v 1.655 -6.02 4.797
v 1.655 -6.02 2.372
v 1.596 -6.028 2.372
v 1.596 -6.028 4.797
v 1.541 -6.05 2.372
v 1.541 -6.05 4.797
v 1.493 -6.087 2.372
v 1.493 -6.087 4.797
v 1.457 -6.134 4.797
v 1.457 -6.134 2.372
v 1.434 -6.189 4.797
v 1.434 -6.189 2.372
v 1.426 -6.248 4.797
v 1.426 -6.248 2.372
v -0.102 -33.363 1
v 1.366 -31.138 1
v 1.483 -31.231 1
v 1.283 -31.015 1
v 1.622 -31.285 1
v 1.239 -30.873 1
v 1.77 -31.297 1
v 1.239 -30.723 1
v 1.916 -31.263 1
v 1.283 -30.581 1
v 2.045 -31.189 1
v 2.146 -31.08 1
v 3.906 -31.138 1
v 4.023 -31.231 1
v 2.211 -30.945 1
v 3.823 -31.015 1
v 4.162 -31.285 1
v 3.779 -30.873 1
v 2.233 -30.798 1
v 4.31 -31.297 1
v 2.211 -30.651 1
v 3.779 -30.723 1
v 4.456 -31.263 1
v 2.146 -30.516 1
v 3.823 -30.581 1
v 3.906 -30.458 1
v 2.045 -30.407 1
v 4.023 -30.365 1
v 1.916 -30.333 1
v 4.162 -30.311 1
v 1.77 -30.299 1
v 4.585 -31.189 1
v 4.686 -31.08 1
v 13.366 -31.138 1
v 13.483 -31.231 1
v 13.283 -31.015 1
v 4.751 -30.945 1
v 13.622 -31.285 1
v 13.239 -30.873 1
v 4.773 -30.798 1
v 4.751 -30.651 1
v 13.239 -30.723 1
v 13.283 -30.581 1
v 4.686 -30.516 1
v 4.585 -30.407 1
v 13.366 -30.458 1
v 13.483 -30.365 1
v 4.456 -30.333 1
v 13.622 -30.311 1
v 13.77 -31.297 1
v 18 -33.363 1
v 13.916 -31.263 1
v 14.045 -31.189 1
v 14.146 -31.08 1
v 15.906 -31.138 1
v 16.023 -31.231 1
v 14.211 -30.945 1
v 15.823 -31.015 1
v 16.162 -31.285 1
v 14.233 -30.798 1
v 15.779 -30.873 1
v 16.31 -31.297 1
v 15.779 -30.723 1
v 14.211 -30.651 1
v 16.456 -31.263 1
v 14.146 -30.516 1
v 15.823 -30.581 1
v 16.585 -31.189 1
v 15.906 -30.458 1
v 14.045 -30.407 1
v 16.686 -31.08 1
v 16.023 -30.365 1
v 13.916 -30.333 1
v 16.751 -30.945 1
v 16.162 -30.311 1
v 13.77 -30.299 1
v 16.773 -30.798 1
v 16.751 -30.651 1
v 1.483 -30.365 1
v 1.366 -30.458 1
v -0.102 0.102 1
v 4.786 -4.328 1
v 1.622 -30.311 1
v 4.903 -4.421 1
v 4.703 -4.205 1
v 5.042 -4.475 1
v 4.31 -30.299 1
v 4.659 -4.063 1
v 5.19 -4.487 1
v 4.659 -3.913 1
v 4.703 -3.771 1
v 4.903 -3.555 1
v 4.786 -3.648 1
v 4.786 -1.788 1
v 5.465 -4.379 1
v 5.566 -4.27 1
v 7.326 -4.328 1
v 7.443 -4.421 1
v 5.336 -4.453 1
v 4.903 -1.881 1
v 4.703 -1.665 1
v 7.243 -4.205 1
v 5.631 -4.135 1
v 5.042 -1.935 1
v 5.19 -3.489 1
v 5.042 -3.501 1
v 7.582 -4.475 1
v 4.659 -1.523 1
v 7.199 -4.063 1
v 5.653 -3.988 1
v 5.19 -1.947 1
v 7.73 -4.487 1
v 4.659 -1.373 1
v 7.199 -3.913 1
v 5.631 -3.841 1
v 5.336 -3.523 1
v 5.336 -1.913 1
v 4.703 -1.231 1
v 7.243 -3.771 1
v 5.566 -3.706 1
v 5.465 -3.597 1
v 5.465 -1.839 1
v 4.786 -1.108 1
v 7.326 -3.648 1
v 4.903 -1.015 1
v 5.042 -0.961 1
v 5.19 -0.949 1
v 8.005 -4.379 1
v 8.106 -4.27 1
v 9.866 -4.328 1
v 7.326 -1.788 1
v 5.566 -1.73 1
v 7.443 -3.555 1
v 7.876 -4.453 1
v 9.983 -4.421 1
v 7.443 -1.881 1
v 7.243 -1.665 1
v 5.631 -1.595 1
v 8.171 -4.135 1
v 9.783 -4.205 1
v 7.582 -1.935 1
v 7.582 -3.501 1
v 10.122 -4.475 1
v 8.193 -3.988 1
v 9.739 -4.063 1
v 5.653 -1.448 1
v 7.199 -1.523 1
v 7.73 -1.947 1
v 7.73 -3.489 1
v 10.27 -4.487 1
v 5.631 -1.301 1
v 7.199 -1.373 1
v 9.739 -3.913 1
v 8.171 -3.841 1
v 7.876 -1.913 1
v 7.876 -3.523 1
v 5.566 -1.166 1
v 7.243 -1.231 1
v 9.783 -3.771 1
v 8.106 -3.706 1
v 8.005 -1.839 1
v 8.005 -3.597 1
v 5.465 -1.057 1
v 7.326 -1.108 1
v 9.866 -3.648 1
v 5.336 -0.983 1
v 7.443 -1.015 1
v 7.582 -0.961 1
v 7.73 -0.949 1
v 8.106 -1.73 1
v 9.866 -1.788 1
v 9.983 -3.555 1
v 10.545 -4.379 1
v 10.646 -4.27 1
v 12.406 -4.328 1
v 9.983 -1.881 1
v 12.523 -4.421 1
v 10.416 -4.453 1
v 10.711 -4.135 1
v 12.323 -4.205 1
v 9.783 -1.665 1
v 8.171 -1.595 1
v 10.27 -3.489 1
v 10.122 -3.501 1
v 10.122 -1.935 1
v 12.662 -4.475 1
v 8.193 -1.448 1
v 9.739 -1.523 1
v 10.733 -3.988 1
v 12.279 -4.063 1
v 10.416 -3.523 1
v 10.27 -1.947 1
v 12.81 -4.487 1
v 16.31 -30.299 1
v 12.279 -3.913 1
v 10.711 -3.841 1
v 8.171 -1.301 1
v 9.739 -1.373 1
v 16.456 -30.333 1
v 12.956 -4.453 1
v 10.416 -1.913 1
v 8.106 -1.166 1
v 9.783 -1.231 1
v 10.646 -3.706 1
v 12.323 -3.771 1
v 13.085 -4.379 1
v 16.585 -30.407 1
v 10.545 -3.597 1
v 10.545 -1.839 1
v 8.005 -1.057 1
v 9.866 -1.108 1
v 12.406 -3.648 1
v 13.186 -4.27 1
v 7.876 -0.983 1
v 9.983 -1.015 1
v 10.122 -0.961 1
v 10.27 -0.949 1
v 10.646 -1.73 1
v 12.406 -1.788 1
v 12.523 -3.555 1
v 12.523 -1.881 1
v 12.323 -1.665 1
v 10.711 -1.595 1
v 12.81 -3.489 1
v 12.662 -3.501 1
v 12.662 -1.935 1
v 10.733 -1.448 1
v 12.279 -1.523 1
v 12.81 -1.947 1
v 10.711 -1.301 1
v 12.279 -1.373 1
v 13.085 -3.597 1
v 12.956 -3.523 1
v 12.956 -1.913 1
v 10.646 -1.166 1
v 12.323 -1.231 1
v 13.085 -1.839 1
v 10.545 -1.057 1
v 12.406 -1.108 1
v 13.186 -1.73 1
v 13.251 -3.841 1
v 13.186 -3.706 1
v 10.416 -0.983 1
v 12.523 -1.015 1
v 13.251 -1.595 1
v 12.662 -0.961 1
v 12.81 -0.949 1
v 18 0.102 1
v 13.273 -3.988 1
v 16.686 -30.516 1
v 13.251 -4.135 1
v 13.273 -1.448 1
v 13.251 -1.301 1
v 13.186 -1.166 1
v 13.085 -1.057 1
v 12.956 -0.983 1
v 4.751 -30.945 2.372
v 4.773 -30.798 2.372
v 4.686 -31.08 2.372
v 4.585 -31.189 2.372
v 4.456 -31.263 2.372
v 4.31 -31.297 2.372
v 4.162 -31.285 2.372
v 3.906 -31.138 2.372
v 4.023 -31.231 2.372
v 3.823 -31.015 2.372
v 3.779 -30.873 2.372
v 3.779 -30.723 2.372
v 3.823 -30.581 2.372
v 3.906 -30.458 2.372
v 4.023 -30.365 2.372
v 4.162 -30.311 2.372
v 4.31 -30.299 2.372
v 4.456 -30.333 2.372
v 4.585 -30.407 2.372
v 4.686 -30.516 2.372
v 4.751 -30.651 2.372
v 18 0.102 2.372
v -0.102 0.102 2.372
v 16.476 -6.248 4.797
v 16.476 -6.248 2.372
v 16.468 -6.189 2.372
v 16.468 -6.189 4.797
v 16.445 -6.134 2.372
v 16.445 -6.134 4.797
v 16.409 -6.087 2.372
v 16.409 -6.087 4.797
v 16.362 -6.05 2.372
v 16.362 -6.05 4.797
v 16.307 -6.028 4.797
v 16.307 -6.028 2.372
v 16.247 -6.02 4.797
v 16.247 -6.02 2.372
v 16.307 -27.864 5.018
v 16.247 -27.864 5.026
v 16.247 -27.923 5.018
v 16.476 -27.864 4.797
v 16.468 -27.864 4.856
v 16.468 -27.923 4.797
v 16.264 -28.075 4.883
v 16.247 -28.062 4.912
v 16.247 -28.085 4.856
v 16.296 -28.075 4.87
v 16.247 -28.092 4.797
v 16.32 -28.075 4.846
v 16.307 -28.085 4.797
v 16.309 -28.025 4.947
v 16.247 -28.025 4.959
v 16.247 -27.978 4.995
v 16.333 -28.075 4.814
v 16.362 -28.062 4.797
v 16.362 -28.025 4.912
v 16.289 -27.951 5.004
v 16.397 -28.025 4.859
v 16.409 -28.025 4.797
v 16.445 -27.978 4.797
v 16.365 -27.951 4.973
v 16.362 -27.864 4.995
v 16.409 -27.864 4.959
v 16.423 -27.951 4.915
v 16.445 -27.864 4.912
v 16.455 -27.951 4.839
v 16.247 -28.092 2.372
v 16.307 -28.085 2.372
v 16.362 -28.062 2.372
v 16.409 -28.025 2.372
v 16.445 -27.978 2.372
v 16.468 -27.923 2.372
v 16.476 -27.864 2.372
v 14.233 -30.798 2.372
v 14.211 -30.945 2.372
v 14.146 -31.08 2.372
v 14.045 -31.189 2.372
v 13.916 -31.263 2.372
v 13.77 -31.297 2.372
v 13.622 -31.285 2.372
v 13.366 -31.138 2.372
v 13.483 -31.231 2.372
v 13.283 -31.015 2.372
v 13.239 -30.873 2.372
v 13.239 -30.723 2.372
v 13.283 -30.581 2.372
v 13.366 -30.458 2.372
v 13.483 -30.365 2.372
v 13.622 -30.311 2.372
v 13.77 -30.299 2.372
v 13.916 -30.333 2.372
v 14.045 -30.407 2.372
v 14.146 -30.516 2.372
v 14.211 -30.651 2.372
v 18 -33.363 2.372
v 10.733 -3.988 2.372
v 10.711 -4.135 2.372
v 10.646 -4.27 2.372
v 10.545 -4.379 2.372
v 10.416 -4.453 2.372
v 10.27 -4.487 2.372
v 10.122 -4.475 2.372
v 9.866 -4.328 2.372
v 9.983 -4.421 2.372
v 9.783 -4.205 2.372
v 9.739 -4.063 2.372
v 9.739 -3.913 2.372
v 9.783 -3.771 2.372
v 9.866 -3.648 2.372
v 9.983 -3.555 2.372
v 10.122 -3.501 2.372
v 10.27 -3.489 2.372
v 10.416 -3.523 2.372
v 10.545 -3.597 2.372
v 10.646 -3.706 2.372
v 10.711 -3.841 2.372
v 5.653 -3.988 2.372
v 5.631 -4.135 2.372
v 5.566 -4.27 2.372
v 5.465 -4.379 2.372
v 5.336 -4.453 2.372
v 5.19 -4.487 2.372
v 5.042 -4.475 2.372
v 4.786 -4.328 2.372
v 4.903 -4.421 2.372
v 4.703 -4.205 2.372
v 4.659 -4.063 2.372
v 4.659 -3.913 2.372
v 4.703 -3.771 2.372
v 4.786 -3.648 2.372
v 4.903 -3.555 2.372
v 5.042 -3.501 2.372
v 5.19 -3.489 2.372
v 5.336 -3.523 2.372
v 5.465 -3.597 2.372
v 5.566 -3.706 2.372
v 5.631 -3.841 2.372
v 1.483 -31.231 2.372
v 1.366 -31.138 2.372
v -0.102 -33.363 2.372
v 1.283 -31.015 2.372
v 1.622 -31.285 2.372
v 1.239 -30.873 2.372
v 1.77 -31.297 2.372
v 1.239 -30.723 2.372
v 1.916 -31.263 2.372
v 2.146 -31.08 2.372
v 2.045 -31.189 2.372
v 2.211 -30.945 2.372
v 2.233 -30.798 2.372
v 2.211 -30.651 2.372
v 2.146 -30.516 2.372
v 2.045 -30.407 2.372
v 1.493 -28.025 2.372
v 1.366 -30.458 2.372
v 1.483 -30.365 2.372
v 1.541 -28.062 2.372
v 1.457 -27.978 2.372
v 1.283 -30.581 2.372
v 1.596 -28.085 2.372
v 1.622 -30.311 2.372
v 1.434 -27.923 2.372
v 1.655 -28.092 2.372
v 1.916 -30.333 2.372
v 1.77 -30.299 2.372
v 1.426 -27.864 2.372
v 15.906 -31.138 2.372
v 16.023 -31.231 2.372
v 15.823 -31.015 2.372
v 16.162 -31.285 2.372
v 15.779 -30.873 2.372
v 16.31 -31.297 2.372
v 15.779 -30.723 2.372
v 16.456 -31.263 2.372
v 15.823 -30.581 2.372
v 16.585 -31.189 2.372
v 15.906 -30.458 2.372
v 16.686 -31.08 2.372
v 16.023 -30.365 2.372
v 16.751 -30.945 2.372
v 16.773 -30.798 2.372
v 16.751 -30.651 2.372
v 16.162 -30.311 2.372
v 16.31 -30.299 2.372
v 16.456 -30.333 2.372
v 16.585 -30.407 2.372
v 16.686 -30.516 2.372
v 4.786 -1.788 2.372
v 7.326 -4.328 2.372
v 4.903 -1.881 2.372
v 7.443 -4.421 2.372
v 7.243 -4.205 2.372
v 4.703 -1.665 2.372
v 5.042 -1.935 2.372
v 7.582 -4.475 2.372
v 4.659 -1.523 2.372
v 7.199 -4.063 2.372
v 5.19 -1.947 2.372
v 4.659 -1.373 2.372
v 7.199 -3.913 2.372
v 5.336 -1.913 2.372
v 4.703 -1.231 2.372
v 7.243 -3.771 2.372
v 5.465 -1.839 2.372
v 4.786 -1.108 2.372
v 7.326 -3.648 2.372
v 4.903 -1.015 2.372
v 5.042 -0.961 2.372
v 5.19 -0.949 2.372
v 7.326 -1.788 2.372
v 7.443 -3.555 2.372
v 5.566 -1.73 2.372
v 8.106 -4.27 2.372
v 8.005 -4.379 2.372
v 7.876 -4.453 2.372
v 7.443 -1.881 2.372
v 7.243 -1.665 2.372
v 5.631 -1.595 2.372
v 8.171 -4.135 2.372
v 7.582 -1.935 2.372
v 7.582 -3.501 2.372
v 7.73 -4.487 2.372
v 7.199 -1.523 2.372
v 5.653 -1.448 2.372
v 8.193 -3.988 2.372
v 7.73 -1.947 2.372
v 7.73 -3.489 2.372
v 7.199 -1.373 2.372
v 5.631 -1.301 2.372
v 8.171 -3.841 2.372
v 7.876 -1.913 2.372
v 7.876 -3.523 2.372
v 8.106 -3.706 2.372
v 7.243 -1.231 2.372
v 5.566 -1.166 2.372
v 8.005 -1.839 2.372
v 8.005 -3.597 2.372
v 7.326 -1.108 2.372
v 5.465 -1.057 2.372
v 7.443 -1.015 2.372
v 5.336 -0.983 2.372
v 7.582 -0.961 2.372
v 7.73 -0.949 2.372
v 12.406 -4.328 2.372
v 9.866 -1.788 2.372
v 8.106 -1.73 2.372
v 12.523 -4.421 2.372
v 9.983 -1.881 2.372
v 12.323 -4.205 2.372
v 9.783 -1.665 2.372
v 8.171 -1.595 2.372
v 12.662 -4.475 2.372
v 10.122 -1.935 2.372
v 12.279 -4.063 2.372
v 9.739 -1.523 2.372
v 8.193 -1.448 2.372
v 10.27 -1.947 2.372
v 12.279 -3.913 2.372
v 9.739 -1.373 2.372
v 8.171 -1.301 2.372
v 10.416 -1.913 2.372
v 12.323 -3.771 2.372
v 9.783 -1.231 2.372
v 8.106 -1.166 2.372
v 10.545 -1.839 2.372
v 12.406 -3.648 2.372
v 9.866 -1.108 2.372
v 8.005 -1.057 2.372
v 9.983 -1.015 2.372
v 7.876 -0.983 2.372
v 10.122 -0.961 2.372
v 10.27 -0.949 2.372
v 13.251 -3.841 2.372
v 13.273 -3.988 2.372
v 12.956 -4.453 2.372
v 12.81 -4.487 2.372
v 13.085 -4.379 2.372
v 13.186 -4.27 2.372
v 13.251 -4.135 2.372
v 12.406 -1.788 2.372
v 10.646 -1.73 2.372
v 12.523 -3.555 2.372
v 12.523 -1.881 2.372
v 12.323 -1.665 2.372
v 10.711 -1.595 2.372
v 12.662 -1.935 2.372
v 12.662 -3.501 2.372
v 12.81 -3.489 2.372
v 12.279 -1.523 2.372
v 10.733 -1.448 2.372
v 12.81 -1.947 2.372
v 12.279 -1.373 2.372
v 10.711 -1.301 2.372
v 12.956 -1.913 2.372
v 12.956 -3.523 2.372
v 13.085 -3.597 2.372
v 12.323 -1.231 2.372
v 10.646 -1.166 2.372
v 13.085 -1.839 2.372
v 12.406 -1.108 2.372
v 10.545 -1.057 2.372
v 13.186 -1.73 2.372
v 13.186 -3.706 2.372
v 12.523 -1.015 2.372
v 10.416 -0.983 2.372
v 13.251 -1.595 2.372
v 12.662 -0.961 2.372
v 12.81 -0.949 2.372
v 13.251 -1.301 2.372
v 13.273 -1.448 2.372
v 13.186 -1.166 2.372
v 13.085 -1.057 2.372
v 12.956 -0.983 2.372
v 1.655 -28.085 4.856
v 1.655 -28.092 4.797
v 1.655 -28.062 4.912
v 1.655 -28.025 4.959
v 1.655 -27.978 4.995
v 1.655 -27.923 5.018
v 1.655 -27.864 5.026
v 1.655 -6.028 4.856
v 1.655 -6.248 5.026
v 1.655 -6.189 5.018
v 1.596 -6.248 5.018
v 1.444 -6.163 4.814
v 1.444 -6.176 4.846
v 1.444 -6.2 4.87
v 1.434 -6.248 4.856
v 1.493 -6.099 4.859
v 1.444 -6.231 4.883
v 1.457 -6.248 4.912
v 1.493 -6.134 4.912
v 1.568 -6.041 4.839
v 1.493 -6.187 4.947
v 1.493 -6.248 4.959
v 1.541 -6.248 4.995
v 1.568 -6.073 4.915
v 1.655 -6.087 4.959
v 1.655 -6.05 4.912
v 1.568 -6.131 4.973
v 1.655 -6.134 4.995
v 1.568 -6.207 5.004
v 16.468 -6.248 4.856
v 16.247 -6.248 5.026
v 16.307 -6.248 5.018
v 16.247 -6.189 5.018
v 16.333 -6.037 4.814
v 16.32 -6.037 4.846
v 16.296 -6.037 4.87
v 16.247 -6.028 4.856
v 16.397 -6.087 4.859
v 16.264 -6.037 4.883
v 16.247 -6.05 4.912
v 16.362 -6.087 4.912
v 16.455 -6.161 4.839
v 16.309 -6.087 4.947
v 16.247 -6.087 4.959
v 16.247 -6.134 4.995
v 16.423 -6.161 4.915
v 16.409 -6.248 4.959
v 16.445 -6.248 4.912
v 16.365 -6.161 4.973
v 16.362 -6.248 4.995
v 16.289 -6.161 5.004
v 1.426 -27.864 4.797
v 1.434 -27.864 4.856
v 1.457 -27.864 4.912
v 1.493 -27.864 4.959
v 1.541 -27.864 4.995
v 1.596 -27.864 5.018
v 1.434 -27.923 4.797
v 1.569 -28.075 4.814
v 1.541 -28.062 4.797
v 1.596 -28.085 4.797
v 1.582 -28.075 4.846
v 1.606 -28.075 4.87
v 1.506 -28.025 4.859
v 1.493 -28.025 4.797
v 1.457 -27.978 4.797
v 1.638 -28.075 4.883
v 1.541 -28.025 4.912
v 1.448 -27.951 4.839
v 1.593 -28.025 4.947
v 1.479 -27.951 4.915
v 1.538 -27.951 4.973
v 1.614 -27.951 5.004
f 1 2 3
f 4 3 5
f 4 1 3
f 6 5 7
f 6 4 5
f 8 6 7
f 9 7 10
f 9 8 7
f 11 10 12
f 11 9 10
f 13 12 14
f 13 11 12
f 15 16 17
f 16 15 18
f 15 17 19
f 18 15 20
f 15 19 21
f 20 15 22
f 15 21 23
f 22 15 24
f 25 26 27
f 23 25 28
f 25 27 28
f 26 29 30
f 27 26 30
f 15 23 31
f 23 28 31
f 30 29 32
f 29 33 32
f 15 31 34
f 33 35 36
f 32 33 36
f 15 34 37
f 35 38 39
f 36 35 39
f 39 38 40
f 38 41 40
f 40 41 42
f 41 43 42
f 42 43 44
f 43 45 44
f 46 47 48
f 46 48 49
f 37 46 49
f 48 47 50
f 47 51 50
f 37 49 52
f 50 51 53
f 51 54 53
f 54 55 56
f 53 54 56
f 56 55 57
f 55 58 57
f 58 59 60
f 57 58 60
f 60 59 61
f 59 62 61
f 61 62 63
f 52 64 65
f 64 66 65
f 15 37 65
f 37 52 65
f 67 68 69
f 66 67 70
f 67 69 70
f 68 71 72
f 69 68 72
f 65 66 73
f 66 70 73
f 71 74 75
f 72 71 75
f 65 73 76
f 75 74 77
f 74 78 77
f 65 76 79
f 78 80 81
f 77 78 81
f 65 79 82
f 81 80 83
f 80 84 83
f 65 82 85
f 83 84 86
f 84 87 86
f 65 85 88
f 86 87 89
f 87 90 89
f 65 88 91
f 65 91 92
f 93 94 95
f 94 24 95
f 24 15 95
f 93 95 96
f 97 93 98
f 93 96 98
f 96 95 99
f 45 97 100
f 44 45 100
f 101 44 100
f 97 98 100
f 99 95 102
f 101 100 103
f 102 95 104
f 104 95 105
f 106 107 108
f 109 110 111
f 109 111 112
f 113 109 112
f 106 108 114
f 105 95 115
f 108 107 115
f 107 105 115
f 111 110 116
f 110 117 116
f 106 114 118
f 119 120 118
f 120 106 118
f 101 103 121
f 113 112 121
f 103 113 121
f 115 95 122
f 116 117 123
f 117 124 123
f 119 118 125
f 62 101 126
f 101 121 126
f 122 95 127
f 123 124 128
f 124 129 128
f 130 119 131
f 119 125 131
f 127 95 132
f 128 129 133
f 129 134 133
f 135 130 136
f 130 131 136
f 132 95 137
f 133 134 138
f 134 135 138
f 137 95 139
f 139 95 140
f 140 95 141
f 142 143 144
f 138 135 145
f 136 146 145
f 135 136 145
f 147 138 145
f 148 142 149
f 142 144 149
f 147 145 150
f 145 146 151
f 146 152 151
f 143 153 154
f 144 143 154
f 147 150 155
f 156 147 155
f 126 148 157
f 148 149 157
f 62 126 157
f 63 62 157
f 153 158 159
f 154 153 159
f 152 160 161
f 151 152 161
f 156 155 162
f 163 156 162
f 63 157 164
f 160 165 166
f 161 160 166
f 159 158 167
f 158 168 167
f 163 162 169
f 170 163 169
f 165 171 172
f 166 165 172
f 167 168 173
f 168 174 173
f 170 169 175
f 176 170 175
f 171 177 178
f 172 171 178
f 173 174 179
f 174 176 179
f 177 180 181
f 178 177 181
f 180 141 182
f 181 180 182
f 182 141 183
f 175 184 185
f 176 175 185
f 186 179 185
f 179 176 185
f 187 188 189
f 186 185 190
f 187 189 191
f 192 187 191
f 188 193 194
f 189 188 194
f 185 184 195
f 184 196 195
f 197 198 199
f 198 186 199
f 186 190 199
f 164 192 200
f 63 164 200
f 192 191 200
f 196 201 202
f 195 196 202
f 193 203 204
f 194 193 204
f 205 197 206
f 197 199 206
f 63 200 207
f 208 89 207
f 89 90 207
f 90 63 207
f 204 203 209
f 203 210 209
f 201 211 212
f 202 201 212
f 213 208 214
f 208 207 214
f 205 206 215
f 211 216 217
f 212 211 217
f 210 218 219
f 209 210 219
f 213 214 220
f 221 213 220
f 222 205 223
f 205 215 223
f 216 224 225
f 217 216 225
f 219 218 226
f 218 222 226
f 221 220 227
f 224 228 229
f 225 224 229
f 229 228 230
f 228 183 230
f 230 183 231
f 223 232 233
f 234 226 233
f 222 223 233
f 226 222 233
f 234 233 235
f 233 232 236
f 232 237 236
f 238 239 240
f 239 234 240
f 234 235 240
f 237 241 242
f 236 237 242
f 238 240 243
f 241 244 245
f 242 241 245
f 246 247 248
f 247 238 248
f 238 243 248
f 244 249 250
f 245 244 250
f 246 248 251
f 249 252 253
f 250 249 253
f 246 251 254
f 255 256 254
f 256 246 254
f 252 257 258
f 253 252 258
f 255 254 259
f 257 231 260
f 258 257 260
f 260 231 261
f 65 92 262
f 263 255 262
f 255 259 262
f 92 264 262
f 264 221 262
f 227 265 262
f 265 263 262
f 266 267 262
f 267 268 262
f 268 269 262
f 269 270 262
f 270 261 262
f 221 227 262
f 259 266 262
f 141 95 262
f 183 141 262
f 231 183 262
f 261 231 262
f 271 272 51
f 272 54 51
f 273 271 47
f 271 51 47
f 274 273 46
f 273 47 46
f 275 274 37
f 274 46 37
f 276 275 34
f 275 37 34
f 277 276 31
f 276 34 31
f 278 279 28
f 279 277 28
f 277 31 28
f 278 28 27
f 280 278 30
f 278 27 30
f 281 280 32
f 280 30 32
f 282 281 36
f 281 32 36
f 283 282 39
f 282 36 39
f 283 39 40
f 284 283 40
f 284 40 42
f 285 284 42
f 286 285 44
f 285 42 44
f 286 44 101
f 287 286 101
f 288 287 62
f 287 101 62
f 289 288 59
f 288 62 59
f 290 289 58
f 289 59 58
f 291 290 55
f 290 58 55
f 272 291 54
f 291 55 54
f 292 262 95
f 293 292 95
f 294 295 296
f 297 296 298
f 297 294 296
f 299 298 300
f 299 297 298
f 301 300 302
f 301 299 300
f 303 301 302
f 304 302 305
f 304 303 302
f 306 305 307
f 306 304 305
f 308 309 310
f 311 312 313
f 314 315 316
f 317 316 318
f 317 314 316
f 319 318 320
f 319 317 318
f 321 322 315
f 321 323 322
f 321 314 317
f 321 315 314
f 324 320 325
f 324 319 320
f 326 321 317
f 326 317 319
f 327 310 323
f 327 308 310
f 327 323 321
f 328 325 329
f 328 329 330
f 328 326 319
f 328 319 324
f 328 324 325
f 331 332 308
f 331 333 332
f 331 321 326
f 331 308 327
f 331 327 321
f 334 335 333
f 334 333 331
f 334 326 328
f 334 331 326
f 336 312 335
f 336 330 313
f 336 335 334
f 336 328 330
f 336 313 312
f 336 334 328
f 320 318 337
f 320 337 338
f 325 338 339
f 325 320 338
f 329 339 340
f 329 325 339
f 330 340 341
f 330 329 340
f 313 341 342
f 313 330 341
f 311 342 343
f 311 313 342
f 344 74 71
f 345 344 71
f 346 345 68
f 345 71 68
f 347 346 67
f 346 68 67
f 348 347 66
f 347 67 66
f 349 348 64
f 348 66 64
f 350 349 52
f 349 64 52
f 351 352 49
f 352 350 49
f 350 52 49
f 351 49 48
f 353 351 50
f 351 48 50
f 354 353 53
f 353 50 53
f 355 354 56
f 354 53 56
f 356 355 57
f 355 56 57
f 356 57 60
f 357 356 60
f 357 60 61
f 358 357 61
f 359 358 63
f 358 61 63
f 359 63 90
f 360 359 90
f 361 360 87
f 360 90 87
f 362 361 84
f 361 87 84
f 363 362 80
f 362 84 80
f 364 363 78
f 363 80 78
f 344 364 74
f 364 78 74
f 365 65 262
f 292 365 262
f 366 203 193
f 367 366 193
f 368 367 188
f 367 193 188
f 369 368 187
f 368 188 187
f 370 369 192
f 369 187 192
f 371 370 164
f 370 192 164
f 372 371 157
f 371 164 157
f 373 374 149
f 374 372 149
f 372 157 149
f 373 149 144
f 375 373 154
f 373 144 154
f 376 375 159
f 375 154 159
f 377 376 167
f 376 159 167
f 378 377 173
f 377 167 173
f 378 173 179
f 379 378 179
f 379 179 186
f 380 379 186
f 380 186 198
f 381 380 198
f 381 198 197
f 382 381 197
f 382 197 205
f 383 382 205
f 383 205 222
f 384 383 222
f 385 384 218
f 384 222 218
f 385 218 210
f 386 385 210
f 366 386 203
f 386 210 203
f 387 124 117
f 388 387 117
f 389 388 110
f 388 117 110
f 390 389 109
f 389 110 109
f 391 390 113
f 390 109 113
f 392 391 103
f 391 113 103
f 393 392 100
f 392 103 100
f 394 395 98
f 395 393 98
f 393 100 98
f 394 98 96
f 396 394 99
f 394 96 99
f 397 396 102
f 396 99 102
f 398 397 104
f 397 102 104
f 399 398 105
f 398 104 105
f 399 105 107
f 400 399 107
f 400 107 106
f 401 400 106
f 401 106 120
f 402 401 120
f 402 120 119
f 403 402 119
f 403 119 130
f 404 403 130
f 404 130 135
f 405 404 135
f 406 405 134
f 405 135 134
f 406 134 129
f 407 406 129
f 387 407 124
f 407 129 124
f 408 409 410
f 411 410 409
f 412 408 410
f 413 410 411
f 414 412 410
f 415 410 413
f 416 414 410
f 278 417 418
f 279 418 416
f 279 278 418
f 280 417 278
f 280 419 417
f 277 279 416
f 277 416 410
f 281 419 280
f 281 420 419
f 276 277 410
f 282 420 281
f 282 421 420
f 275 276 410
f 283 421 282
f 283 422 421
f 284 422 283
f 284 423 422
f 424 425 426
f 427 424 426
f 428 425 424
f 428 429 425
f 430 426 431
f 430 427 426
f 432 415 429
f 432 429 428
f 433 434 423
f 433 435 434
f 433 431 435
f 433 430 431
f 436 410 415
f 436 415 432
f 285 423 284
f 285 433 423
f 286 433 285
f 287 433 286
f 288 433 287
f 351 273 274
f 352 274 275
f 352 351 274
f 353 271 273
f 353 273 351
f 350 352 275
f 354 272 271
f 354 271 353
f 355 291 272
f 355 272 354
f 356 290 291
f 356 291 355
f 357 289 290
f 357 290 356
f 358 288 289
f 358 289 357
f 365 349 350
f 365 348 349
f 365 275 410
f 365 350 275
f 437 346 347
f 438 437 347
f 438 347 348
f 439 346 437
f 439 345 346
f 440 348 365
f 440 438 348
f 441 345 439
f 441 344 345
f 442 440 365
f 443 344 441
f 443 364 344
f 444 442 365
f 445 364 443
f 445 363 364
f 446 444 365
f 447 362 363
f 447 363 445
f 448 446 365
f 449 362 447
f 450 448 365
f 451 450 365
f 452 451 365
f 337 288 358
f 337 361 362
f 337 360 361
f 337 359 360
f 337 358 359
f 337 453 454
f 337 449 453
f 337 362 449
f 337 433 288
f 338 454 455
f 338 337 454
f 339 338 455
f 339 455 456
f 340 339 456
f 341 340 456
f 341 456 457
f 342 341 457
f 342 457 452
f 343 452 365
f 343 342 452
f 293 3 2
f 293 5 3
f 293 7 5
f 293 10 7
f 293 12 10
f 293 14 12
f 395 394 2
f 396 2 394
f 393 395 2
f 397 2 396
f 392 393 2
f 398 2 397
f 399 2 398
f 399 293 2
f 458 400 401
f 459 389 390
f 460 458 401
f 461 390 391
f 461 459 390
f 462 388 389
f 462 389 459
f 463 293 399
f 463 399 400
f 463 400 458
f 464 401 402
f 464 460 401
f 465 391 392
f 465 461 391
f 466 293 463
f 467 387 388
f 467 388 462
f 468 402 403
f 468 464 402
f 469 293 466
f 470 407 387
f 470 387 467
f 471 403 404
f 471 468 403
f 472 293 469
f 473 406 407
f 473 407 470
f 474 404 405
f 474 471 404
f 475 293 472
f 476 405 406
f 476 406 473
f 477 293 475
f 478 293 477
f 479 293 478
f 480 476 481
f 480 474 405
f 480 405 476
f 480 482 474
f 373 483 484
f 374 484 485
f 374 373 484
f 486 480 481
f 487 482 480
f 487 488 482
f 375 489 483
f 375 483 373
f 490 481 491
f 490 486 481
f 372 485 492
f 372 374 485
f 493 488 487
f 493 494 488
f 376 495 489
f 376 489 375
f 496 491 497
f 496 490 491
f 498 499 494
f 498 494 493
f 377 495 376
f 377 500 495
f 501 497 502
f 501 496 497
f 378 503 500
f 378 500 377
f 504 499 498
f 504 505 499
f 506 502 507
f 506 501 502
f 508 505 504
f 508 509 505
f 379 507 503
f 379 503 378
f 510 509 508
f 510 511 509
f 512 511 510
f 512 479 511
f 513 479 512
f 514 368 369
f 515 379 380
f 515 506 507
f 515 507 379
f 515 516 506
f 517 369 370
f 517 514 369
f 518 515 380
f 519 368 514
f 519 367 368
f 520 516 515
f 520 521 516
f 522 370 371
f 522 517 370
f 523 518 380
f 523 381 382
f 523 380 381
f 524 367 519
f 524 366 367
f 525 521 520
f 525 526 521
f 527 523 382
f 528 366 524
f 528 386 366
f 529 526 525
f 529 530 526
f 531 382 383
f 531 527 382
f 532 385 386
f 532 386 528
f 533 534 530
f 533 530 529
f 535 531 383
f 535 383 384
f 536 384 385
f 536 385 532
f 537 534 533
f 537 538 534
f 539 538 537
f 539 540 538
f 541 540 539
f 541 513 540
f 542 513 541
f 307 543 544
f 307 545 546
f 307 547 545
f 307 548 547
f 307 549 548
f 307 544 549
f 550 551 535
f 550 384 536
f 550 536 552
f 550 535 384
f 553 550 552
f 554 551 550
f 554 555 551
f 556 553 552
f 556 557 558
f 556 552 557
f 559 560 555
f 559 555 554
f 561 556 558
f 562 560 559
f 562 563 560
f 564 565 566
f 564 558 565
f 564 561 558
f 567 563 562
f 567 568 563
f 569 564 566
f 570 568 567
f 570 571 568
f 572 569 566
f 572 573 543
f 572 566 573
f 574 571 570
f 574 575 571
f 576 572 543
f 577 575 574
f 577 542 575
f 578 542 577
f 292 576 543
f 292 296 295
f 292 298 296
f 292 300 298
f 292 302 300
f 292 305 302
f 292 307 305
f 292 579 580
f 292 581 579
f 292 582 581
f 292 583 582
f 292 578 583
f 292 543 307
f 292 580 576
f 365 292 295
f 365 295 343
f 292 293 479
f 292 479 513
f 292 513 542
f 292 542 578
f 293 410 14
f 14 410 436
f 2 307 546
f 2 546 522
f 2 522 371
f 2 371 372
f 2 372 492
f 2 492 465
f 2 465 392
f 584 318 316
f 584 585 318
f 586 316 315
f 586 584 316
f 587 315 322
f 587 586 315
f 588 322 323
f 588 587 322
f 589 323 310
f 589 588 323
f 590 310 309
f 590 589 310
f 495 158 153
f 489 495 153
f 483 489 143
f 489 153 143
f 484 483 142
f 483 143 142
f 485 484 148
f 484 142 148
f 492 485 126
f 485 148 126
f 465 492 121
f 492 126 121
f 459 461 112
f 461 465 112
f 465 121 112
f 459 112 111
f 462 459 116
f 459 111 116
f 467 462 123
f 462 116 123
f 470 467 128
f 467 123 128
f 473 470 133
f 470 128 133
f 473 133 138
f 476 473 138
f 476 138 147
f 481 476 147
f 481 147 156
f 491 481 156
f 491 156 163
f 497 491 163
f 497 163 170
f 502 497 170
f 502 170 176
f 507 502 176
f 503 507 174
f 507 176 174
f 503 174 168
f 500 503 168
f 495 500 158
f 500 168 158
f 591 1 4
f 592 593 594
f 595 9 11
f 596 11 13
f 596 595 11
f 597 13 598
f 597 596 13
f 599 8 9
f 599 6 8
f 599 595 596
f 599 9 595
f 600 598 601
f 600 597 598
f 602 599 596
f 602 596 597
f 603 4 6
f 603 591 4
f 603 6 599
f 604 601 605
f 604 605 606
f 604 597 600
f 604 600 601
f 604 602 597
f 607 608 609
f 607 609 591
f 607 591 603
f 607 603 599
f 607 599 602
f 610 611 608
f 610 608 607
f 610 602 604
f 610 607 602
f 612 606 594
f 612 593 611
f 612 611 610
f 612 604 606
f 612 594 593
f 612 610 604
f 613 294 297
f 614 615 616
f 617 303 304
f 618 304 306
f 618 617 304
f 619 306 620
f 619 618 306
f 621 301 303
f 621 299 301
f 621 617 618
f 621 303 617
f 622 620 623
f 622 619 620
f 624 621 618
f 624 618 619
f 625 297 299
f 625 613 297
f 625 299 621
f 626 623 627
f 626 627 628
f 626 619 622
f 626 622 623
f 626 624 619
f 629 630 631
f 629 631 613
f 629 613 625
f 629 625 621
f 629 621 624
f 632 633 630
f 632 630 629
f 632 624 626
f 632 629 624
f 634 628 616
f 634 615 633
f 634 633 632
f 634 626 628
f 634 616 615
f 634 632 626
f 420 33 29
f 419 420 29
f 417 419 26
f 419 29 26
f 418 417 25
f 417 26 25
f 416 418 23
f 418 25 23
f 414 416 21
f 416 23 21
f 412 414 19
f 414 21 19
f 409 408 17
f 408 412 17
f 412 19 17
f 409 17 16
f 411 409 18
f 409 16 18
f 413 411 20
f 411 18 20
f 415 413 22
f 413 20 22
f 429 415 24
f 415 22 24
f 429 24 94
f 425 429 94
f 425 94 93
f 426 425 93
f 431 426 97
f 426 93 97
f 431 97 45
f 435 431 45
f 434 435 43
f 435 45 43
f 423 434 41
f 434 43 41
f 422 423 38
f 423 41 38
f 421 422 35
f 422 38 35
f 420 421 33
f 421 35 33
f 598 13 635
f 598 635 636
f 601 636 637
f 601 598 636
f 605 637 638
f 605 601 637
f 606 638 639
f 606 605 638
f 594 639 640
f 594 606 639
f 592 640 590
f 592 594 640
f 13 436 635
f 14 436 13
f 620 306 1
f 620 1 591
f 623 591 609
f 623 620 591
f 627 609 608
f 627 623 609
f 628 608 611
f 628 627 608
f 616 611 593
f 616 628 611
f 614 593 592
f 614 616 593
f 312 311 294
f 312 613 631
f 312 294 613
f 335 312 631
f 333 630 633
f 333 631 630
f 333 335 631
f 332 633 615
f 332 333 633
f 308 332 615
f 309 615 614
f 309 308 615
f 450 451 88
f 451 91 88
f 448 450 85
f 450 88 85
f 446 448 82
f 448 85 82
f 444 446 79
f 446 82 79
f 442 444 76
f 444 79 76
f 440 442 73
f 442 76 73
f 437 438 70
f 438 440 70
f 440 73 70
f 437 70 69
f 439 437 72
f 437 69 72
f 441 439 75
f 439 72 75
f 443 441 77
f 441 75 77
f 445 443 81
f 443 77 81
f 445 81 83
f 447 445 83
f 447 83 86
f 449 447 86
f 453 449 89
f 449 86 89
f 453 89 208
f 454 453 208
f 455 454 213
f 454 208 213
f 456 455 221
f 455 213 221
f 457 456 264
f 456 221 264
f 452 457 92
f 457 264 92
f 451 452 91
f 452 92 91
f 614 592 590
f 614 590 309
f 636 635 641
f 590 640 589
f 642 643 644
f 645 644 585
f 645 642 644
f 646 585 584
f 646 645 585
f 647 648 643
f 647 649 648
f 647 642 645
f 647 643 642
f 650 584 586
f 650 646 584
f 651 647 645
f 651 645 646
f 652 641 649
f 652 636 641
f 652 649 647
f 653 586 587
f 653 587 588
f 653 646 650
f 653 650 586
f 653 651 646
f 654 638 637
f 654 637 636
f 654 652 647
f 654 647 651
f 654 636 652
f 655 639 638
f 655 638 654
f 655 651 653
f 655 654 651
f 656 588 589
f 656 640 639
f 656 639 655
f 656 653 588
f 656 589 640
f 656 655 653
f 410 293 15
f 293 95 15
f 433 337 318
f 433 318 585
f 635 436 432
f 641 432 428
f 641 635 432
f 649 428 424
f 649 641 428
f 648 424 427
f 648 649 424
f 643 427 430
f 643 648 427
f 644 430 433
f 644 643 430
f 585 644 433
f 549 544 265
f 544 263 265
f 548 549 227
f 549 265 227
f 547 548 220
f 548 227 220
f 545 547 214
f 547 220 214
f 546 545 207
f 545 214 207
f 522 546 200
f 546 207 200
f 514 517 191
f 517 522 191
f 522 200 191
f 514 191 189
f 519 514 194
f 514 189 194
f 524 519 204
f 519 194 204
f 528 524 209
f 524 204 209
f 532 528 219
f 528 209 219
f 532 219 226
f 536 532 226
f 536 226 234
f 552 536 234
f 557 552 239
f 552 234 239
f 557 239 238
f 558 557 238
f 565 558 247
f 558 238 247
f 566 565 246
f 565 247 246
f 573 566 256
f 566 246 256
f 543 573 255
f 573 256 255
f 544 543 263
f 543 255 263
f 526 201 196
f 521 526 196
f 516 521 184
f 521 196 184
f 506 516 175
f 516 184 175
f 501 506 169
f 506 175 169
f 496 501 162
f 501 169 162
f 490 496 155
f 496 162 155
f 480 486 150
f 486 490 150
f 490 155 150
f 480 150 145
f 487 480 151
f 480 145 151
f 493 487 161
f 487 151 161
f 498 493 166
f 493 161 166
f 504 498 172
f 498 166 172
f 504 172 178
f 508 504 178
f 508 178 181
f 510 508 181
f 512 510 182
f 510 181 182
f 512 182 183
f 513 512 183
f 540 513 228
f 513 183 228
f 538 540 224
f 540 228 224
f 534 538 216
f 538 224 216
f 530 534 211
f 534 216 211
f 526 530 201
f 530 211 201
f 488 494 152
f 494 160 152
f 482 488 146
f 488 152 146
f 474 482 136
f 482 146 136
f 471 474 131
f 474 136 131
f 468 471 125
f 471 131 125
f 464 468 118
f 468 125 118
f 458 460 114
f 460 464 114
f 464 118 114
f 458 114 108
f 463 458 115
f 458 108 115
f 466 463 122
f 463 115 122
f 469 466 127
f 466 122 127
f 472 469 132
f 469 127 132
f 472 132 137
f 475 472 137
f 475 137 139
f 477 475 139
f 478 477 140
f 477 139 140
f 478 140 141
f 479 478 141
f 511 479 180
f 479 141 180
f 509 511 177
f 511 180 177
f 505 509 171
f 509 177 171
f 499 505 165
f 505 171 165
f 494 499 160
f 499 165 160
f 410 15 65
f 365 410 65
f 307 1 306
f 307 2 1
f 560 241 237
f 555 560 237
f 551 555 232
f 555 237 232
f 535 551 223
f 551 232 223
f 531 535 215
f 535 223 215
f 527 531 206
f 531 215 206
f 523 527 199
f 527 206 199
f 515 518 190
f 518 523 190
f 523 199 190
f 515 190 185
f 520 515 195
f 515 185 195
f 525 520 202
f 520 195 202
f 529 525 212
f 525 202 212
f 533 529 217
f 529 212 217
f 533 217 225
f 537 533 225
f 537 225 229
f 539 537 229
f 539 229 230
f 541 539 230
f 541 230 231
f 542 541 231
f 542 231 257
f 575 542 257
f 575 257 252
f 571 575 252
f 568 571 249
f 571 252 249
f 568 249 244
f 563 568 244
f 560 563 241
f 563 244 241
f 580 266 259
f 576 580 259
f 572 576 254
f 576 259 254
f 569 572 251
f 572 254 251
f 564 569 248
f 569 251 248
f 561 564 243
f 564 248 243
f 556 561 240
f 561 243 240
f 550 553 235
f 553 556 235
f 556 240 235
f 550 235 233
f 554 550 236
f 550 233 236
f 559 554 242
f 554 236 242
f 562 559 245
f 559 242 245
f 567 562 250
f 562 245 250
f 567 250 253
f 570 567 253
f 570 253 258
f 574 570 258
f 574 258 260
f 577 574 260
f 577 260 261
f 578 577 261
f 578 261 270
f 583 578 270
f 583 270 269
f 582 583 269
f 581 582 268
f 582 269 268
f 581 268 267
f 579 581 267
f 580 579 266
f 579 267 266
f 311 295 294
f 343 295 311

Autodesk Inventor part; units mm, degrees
ref_plane "YZ Plane" through (0, 0, 0) normal (1, 0, 0) x (0, 1, 0)
ref_plane "XZ Plane" through (0, 0, 0) normal (0, 1, 0) x (-1, 0, 0)
ref_plane "XY Plane" through (0, 0, 0) normal (0, 0, 1) x (1, 0, 0)
ref_plane "Work Plane1" through (0, 0, 1) normal (0, 0, 1) x (1, 0, 0)
sketch "Sketch2" plane through (0, 0, 1) normal (0, 0, 1) x (1, 0, 0)
  circle A0 centre (-25.527, 21.082) radius 1.5875 projected
  circle A1 centre (-25.527, -29.718) radius 1.5875 projected
  circle A2 centre (21.463, 21.082) radius 1.5875 projected
  circle A3 centre (21.463, -29.718) radius 1.5875 projected
  circle A4 centre (20.213, 14.652) radius 0.595 projected
  circle A5 centre (20.213, 9.652) radius 0.595 projected
  circle A6 centre (20.213, 4.652) radius 0.595 projected
  circle A7 centre (-25.527, 4.572) radius 0.51 projected
  circle A8 centre (-25.527, 2.032) radius 0.51 projected
  circle A9 centre (-25.527, -0.508) radius 0.51 projected
  circle A10 centre (-25.527, -9.398) radius 0.51 projected
  circle A11 centre (-25.527, -6.858) radius 0.51 projected
  circle A12 centre (7.493, 13.462) radius 0.5 projected
  circle A13 centre (10.033, 13.462) radius 0.5 projected
  circle A14 centre (12.573, 13.462) radius 0.5 projected
  circle A15 centre (12.773, -3.988) radius 0.5 projected
  circle A16 centre (7.693, -1.448) radius 0.5 projected
  circle A17 centre (16.273, -30.798) radius 0.5 projected
  circle A18 centre (13.733, -30.798) radius 0.5 projected
  circle A19 centre (4.273, -30.798) radius 0.5 projected
  circle A20 centre (1.733, -30.798) radius 0.5 projected
  circle A21 centre (7.693, -3.988) radius 0.5 projected
  circle A22 centre (5.153, -1.448) radius 0.5 projected
  circle A23 centre (5.153, -3.988) radius 0.5 projected
  circle A24 centre (12.773, -1.448) radius 0.5 projected
  circle A25 centre (10.233, -3.988) radius 0.5 projected
  circle A26 centre (10.233, -1.448) radius 0.5 projected
  circle A27 centre (-19.427, 6.092) radius 0.5 projected
  circle A28 centre (-19.427, 3.552) radius 0.5 projected
  circle A29 centre (-19.427, 1.012) radius 0.5 projected
  circle A30 centre (-19.427, -1.528) radius 0.5 projected
  circle A31 centre (-19.427, -4.068) radius 0.5 projected
  circle A32 centre (-19.427, -6.608) radius 0.5 projected
  circle A33 centre (-19.427, -9.148) radius 0.5 projected
  circle A34 centre (-19.427, -11.688) radius 0.5 projected
  circle A35 centre (-19.427, -14.228) radius 0.5 projected
  circle A36 centre (-19.427, -16.768) radius 0.5 projected
  circle A37 centre (-19.427, -19.308) radius 0.5 projected
  circle A38 centre (-19.427, -21.848) radius 0.5 projected
  circle A39 centre (-19.427, -24.388) radius 0.5 projected
  circle A40 centre (-19.427, -26.928) radius 0.5 projected
  circle A41 centre (-19.427, -29.468) radius 0.5 projected
  circle A42 centre (-4.187, 6.092) radius 0.5 projected
  circle A43 centre (-4.187, 3.552) radius 0.5 projected
  circle A44 centre (-4.187, 1.012) radius 0.5 projected
  circle A45 centre (-4.187, -1.528) radius 0.5 projected
  circle A46 centre (-4.187, -4.068) radius 0.5 projected
  circle A47 centre (-4.187, -6.608) radius 0.5 projected
  circle A48 centre (-4.187, -9.148) radius 0.5 projected
  circle A49 centre (-4.187, -11.688) radius 0.5 projected
  circle A50 centre (-4.187, -14.228) radius 0.5 projected
  circle A51 centre (-4.187, -16.768) radius 0.5 projected
  circle A52 centre (-4.187, -19.308) radius 0.5 projected
  circle A53 centre (-4.187, -21.848) radius 0.5 projected
  circle A54 centre (-4.187, -24.388) radius 0.5 projected
  circle A55 centre (-4.187, -26.928) radius 0.5 projected
  circle A56 centre (-4.187, -29.468) radius 0.5 projected
  circle A57 centre (0.893, 13.462) radius 0.405 projected
  circle A58 centre (3.433, 13.462) radius 0.405 projected
  circle A59 centre (1.143, 5.842) radius 0.405 projected
  circle A60 centre (3.683, 5.842) radius 0.405 projected
  circle A61 centre (9.143, 21.672) radius 0.4 projected
  circle A62 centre (10.413, 19.732) radius 0.4 projected
  circle A63 centre (11.933, 21.672) radius 0.4 projected
  circle A64 centre (13.463, 19.732) radius 0.4 projected
  circle A65 centre (-24.257, -23.368) radius 0.375 projected
  circle A66 centre (-24.257, -20.828) radius 0.375 projected
  circle A67 centre (-24.257, -18.288) radius 0.375 projected
  circle A68 centre (-25.527, 9.942) radius 0.35 projected
  circle A69 centre (-25.527, 11.442) radius 0.35 projected
  circle A70 centre (-25.527, 12.942) radius 0.35 projected
  circle A71 centre (-25.527, 14.442) radius 0.35 projected
  circle A72 centre (-16.002, 5.842) radius 0.254 projected
  circle A73 centre (-3.302, 7.747) radius 0.254 projected
  circle A74 centre (-12.192, 4.572) radius 0.254 projected
  circle A75 centre (-5.842, -1.778) radius 0.254 projected
  circle A76 centre (-12.192, -3.683) radius 0.254 projected
  circle A77 centre (-19.812, 9.017) radius 0.254 projected
  circle A78 centre (-22.352, -11.303) radius 0.254 projected
  circle A79 centre (-21.717, -7.493) radius 0.254 projected
  circle A80 centre (-10.922, -12.573) radius 0.254 projected
  circle A81 centre (-10.922, 7.112) radius 0.254 projected
  circle A82 centre (-9.652, -11.303) radius 0.254 projected
  circle A83 centre (-7.112, 9.017) radius 0.254 projected
  line L0 (25.273, 24.892) -> (-29.337, 24.892) projected
  line L1 (-29.337, 24.892) -> (-29.337, -33.528) projected
  line L2 (-29.337, -33.528) -> (25.273, -33.528) projected
  line L3 (25.273, -33.528) -> (25.273, 24.892) projected
  line L4 (18, -43) -> (18, 0.1016) projected
  line L5 (-0.1016, 0.1016) -> (-0.1016, -43) projected
  line L6 (18, 0.1016) -> (-0.1016, 0.1016)
  line L7 (-0.1016, 0.1016) -> (-0.1016, -33.3629)
  line L8 (-0.1016, -33.3629) -> (18, -33.3629)
  line L9 (18, -33.3629) -> (18, 0.1016)
  point P0 (0, 0)
  dimension "d3" = 33.4645
extrude "Extrusion2" add sketch "Sketch2" along normal blind 1.3716 contours L8 L5 L6 L4
sketch "Sketch3" plane through (0, 0, 2.3716) normal (0, 0, 1) x (1, 0, 0)
  circle A0 centre (10.233, -1.448) radius 0.5 projected
  circle A1 centre (10.233, -3.988) radius 0.5 projected
  circle A2 centre (12.773, -1.448) radius 0.5 projected
  circle A3 centre (5.153, -3.988) radius 0.5 projected
  circle A4 centre (5.153, -1.448) radius 0.5 projected
  circle A5 centre (7.693, -3.988) radius 0.5 projected
  circle A6 centre (1.733, -30.798) radius 0.5 projected
  circle A7 centre (4.273, -30.798) radius 0.5 projected
  circle A8 centre (13.733, -30.798) radius 0.5 projected
  circle A9 centre (16.273, -30.798) radius 0.5 projected
  circle A10 centre (7.693, -1.448) radius 0.5 projected
  circle A11 centre (12.773, -3.988) radius 0.5 projected
  line L0 (18, 0.1016) -> (-0.1016, 0.1016) projected
  line L1 (-0.1016, 0.1016) -> (-0.1016, -33.3629) projected
  line L2 (-0.1016, -33.3629) -> (18, -33.3629) projected
  line L3 (18, -33.3629) -> (18, 0.1016) projected
  line L4 (16.476, -28.0924) -> (1.4265, -28.0924)
  line L5 (1.4265, -28.0924) -> (1.4265, -6.0198)
  line L6 (1.4265, -6.0198) -> (16.476, -6.0198)
  line L7 (16.476, -6.0198) -> (16.476, -28.0924)
  point P0 (0, 0)
  dimension "d6" = 15.0495
  dimension "d7" = 22.0726
  dimension "d8" = 5.2705
  dimension "d9" = 1.524
extrude "Extrusion3" add sketch "Sketch3" along normal blind 2.6543 contours L4 L5 L6 L7
fillet "Fillet1" radius 0.2286 8 edges at (16.476, -17.0561, 5.0259) (8.9513, -6.0198, 5.0259) (1.4265, -17.0561, 5.0259) (8.9513, -28.0924, 5.0259) (16.476, -28.0924, 3.6988) (1.4265, -28.0924, 3.6988) (16.476, -6.0198, 3.6988) (1.4265, -6.0198, 3.6988)
sketch "Sketch4" plane through (0, 0, 5.0259) normal (0, 0, 1) x (1, 0, 0)
  line L0 (16.2703, -6.3451) -> (16.2703, -27.5869) construction
  line L1 (16.2703, -27.5869) -> (1.6519, -27.5869) construction
  line L2 (1.6519, -27.5869) -> (1.6519, -6.3451) construction
  line L3 (1.6519, -6.3451) -> (16.2703, -6.3451) construction
  point P0 (0, 0)
decal "Decal1"
properties part number "E01-ML01DP5"
